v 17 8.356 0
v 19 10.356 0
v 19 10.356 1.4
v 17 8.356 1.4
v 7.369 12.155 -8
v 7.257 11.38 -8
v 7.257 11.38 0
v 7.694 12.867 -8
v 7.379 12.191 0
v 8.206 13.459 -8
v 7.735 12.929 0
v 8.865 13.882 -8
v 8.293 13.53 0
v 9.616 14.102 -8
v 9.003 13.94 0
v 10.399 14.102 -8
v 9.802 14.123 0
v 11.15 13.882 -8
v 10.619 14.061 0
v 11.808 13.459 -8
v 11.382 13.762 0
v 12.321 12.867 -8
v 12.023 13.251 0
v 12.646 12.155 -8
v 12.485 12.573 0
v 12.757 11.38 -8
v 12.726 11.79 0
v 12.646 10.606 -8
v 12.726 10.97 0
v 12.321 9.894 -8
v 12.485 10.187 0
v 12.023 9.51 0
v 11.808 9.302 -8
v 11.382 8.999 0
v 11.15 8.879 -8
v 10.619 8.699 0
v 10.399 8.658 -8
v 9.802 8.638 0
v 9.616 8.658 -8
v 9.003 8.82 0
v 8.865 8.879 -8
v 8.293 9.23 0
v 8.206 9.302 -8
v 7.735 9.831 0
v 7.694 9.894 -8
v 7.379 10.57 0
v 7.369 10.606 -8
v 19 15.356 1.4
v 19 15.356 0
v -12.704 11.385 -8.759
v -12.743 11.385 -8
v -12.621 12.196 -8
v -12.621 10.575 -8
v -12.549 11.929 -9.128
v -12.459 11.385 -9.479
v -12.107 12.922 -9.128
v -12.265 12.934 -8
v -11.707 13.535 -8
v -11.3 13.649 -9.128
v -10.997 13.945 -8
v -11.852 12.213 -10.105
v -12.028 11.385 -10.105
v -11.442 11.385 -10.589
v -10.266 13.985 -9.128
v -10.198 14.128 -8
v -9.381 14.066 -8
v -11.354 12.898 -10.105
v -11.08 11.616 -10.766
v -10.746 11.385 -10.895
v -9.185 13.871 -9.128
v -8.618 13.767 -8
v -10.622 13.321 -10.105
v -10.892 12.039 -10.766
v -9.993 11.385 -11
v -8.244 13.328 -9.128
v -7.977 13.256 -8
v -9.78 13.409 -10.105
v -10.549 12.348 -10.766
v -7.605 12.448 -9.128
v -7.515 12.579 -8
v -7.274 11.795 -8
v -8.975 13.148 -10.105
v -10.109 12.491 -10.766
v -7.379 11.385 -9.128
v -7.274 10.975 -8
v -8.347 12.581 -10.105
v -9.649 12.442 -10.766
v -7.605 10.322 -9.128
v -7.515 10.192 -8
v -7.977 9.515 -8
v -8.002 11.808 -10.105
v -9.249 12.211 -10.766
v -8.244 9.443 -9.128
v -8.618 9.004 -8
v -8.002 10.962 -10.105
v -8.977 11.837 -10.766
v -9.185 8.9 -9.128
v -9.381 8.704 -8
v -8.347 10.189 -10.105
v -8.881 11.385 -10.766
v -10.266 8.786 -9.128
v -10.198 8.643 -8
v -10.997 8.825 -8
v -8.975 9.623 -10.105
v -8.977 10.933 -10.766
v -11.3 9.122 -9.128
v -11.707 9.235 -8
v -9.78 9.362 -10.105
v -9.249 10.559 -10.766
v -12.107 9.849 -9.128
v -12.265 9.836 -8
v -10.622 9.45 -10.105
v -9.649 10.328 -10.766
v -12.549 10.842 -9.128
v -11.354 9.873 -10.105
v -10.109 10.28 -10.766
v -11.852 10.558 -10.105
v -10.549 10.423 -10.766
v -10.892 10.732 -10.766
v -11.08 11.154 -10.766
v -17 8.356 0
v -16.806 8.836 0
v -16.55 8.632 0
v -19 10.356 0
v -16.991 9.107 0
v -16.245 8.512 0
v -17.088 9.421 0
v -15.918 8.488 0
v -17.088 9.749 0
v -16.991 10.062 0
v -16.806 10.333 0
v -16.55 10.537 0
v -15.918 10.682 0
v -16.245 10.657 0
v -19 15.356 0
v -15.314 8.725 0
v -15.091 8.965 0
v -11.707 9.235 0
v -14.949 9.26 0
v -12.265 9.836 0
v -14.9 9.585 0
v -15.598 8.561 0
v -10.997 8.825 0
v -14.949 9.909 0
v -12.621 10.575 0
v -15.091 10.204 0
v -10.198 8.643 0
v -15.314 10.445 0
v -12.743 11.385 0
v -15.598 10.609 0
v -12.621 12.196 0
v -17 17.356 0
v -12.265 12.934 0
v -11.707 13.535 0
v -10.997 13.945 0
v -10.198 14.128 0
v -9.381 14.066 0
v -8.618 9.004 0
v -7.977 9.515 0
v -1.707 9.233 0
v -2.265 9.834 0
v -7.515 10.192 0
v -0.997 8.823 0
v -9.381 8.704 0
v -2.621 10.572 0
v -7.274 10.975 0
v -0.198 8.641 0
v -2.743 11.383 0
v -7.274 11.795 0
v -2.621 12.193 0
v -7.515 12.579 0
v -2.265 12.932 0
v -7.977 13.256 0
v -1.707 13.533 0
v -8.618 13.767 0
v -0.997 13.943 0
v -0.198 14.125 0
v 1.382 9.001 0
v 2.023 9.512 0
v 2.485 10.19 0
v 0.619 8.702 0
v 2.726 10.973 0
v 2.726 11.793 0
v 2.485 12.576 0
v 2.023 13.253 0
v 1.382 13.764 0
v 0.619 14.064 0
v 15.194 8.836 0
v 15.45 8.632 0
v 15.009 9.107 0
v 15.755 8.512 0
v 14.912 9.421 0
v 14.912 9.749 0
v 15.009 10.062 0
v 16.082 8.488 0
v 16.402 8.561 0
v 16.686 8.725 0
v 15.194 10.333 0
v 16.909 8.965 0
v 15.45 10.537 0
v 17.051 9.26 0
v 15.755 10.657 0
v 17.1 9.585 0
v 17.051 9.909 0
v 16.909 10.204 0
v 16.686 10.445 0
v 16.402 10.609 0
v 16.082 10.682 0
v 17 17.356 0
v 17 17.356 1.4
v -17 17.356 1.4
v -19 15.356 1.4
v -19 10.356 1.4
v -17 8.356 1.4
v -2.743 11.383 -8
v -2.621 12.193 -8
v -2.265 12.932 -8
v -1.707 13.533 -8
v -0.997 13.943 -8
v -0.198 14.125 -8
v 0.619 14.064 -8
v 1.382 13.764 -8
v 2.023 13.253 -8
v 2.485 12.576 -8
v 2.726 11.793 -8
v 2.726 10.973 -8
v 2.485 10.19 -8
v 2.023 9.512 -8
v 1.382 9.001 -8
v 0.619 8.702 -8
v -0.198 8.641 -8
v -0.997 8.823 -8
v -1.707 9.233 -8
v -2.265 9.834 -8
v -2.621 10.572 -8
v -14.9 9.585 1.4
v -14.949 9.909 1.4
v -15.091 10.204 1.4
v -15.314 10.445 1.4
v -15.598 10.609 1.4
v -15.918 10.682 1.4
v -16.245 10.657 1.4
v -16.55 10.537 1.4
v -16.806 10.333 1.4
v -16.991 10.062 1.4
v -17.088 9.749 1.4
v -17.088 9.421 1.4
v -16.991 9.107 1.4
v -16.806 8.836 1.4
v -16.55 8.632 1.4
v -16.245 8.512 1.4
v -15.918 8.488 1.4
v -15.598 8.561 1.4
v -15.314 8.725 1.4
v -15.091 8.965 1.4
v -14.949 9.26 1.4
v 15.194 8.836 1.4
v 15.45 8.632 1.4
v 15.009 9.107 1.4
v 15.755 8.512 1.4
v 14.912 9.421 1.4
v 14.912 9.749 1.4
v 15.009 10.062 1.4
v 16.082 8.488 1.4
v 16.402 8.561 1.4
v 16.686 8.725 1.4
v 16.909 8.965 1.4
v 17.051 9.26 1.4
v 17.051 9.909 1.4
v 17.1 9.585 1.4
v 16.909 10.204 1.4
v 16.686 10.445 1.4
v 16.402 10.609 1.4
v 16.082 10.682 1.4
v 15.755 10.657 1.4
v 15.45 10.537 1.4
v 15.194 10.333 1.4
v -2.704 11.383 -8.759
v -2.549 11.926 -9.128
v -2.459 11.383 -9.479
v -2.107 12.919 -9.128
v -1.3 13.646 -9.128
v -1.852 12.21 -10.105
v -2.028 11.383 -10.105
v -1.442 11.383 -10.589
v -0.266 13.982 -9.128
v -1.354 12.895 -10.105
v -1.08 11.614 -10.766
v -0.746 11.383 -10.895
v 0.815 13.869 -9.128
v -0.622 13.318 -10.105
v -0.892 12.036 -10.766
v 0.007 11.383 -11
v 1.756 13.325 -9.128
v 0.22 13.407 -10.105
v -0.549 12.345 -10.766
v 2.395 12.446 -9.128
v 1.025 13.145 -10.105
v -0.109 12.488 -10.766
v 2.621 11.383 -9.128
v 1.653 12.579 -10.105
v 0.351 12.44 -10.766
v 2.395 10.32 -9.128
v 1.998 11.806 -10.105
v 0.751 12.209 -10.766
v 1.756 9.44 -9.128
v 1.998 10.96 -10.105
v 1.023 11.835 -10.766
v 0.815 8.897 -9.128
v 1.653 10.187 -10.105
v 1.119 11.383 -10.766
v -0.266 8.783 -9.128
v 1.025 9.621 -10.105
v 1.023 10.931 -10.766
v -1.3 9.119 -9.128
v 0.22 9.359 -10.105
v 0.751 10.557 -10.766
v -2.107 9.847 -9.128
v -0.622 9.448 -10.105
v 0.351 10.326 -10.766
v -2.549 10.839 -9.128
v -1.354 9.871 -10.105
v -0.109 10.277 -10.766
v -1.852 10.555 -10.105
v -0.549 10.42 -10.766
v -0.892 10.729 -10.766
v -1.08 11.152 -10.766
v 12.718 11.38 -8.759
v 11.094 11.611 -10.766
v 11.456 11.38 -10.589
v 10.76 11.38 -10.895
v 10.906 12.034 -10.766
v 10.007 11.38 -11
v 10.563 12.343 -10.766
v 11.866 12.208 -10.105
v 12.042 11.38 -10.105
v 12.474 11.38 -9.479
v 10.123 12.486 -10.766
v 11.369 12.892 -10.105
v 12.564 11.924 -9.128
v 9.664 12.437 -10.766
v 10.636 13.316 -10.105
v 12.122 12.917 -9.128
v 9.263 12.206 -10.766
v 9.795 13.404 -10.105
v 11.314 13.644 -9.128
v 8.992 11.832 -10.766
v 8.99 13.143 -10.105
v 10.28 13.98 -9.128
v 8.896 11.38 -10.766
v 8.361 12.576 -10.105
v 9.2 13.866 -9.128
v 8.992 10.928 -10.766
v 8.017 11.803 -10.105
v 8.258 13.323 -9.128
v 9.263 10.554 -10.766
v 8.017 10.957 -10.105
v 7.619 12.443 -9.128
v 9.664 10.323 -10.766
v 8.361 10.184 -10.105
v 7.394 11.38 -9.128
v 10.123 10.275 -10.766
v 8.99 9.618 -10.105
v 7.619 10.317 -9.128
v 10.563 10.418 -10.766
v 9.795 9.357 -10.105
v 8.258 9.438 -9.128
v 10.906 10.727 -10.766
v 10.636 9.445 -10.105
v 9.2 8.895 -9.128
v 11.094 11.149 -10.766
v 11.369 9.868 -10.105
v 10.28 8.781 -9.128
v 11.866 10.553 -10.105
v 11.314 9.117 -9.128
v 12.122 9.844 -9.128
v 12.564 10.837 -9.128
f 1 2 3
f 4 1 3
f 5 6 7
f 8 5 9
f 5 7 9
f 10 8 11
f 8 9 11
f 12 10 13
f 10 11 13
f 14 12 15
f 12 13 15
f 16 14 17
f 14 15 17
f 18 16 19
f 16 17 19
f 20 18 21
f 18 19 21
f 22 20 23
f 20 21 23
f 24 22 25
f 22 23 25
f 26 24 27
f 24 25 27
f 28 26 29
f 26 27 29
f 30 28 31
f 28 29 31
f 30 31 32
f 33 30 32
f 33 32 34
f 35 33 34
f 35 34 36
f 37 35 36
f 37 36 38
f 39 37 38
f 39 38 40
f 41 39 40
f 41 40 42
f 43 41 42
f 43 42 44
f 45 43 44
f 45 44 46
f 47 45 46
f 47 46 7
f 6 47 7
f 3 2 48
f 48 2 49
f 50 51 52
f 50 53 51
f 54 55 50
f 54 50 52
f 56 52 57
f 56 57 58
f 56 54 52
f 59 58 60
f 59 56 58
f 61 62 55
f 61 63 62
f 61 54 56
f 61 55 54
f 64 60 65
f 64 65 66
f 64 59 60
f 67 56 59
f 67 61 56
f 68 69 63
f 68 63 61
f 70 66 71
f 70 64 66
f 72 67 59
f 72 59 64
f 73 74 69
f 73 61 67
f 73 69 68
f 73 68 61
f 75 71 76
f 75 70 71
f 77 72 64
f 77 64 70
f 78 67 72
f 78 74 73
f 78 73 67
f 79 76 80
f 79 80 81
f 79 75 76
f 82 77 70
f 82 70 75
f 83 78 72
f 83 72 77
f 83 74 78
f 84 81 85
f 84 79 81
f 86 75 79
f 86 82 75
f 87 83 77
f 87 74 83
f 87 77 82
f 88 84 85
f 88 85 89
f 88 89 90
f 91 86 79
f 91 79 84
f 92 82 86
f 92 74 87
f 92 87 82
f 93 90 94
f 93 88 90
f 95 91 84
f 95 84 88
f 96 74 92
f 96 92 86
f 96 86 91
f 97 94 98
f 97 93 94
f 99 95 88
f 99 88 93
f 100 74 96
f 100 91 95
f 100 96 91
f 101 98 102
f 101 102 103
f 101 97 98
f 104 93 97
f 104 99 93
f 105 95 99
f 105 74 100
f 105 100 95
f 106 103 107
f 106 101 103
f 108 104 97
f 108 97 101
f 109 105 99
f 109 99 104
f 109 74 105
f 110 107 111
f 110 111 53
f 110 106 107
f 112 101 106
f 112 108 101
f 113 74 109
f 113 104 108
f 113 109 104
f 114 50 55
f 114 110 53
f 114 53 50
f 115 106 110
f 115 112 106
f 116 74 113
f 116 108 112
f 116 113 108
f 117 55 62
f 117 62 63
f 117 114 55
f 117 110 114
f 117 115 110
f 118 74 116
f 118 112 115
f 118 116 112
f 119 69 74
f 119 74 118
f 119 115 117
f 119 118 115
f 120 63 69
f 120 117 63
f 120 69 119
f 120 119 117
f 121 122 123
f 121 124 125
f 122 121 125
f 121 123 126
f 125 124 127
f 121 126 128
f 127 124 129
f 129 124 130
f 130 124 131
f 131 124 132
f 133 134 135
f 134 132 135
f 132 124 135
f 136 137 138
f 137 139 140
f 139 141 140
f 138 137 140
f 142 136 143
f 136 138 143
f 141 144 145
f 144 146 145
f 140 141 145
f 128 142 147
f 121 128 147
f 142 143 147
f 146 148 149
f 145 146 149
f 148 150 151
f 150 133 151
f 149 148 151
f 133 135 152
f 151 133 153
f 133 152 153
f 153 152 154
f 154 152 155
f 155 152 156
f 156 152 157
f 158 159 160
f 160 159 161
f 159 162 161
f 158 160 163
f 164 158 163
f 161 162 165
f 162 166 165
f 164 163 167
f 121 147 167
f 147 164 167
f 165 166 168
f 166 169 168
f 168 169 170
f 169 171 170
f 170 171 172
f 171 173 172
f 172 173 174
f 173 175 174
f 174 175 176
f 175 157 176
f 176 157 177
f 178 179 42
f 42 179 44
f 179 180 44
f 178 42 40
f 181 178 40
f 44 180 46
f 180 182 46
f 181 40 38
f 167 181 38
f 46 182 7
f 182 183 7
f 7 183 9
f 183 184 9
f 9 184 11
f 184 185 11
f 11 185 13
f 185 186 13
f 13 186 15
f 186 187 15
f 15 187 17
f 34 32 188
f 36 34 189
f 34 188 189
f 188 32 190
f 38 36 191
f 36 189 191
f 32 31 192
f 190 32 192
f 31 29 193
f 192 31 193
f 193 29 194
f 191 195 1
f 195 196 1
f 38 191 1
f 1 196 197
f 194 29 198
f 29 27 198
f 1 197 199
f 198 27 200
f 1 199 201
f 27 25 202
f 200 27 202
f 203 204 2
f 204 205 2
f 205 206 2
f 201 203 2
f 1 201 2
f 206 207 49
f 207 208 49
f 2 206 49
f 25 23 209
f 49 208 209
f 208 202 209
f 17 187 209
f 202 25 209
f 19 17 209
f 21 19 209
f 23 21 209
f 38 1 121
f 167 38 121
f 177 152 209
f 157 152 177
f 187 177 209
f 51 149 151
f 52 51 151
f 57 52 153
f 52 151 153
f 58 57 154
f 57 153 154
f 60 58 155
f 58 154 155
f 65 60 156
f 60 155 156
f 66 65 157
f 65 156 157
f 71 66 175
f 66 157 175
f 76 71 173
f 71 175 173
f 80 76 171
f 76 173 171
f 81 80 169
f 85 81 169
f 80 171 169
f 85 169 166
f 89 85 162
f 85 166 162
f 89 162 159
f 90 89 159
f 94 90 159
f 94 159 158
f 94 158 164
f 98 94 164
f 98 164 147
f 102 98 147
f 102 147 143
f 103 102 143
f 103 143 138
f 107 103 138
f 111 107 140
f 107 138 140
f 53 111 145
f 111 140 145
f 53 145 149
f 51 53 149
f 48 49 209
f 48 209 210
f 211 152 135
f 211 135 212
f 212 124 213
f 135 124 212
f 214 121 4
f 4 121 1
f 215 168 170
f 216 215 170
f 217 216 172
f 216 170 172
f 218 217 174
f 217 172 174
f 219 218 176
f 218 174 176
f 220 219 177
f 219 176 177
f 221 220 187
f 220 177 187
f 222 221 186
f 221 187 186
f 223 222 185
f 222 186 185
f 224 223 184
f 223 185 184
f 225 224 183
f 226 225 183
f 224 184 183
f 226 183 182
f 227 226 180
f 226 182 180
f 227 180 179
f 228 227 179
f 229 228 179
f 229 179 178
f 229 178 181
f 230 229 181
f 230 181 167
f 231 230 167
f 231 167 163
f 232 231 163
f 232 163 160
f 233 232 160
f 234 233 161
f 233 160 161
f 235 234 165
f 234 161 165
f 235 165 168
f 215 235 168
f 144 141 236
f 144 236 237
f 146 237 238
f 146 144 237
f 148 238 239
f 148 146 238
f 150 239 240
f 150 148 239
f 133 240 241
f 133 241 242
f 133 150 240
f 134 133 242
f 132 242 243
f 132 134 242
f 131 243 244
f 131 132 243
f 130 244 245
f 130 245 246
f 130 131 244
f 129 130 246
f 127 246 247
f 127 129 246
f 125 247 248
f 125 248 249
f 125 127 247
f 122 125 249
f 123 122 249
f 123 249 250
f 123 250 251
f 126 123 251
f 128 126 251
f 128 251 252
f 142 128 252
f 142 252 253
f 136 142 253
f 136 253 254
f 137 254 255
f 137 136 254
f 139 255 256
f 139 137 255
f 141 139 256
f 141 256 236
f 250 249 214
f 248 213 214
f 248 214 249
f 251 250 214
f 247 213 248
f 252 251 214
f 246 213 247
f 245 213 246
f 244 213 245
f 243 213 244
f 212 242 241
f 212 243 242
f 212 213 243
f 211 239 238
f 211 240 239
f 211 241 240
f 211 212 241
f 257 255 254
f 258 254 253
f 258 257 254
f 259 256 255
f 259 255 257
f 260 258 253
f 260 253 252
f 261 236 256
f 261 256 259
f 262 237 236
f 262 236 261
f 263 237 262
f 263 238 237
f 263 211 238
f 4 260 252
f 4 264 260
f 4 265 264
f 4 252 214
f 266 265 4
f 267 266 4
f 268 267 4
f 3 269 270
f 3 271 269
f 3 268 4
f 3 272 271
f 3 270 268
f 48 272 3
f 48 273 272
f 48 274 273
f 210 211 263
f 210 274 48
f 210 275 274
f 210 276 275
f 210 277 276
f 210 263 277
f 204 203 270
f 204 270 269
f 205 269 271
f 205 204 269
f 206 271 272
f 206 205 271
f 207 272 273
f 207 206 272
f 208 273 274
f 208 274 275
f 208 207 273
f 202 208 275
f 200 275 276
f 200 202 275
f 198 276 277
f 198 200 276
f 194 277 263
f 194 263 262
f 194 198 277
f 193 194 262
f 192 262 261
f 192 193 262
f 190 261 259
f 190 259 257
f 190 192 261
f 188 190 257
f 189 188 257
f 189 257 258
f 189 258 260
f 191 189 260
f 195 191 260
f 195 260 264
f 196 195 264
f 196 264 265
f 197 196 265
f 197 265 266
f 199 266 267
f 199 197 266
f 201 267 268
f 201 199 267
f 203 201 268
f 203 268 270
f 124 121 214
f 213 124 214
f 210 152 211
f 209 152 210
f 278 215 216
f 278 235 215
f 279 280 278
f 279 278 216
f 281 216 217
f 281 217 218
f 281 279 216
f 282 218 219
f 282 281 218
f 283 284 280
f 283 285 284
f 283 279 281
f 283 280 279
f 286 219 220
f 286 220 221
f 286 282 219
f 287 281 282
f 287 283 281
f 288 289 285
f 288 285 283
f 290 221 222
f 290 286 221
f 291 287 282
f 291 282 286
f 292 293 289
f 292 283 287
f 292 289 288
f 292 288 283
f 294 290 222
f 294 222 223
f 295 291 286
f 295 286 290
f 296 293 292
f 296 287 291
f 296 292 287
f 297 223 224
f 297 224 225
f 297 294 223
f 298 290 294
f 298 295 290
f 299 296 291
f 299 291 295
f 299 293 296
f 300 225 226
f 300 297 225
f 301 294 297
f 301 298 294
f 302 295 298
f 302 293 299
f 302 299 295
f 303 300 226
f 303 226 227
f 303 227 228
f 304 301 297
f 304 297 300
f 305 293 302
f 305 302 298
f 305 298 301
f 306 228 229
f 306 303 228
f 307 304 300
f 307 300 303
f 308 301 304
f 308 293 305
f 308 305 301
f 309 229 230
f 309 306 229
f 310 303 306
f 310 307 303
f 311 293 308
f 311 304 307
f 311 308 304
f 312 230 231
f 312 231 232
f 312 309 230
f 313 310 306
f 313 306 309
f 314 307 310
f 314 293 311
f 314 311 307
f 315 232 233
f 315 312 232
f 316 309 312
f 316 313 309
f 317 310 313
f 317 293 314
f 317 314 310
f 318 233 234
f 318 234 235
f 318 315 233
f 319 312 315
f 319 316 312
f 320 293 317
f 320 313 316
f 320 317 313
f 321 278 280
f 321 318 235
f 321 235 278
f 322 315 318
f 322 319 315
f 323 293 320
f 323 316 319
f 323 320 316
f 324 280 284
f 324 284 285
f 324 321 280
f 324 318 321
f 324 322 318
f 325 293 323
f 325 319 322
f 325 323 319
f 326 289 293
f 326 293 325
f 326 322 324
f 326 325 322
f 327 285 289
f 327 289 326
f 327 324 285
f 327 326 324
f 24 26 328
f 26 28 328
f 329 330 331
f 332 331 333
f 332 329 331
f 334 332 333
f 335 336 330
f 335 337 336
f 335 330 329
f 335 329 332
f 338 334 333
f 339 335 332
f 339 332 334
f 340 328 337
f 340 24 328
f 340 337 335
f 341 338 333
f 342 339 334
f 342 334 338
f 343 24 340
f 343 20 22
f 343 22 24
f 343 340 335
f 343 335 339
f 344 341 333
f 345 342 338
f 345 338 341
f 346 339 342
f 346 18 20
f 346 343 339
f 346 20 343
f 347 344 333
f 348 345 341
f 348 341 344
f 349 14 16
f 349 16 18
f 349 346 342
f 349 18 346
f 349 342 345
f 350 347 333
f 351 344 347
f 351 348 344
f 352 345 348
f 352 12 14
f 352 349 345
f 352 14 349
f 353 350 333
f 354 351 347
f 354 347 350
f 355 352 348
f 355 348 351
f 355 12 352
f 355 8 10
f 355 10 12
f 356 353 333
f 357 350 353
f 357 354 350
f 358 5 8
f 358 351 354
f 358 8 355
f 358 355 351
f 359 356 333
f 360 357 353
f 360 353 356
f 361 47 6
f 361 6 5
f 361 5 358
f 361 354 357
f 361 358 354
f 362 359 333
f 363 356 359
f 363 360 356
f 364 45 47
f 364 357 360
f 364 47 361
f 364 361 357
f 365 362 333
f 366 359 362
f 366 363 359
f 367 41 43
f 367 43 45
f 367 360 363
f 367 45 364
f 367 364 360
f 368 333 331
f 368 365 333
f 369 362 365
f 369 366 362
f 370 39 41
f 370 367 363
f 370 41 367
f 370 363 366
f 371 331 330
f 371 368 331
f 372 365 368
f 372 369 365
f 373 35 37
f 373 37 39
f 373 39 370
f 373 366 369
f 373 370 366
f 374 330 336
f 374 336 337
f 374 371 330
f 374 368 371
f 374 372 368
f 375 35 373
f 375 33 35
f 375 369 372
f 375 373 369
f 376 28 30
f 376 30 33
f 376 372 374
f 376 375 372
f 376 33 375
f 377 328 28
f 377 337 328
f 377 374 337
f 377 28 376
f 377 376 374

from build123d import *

# Parameters (mm, degrees)
ESQUISSE1_W       = 38
ESQUISSE1_H       = 9
ESQUISSE1_R       = 1.1
EXTRUSION1_DEPTH  = 1.4
CHANFREIN1_SIZE   = 2
ESQUISSE3_R       = 2.75
EXTRUSION2_DEPTH  = 8
D_ME1_FACE_RADIUS = 2.75
D_ME1_HEIGHT      = 3
D_ME2_FACE_RADIUS = 2.75
D_ME2_HEIGHT      = 3


# Read off the part's stored shape, not the designer's step: Dôme3
with BuildPart() as part:
    # Esquisse1 → Extrusion1 (new body)
    with BuildSketch(Plane.XY):
        with Locations((0, 12.855949766)):
            Rectangle(ESQUISSE1_W, ESQUISSE1_H)
        with Locations((16, 9.584679883)):
            Circle(ESQUISSE1_R, mode=Mode.SUBTRACT)
        with Locations((-16, 9.584679883)):
            Circle(ESQUISSE1_R, mode=Mode.SUBTRACT)
    extrude(amount=EXTRUSION1_DEPTH)

    # Chanfrein1
    chanfrein1_edges = [part.edges().sort_by_distance(p)[0] for p in [
        (-19, 17.355949766, 0.7),
        (19, 17.355949766, 0.7),
        (19, 8.355949766, 0.7),
        (-19, 8.355949766, 0.7),
    ]]
    chamfer(chanfrein1_edges, length=CHANFREIN1_SIZE)

    # Esquisse3 → Extrusion2 (add)
    with BuildSketch(Plane(origin=(0, 0, 0), x_dir=(-1, 0, 0), z_dir=(0, 0, -1))):
        with Locations((-10.007204419, 11.380286636)):
            Circle(ESQUISSE3_R)
        with Locations((-0.007204739, 11.382819166)):
            Circle(ESQUISSE3_R)
        with Locations((9.99279494, 11.385351696)):
            Circle(ESQUISSE3_R)
    extrude(amount=EXTRUSION2_DEPTH)

    # Dôme1: a dome of height H over a round flat face of radius A is a cap of a sphere of radius (A * A + H * H) / (2 * H)
    d_me1_r = (D_ME1_FACE_RADIUS * D_ME1_FACE_RADIUS + D_ME1_HEIGHT * D_ME1_HEIGHT) / (2 * D_ME1_HEIGHT)
    d_me1_base = Plane((-9.99279494, 11.385351696, -8), z_dir=(0, 0, -1))
    with Locations(d_me1_base.offset(D_ME1_HEIGHT - d_me1_r)):
        d_me1_ball = Sphere(d_me1_r, mode=Mode.PRIVATE)
    add(split(d_me1_ball, bisect_by=d_me1_base, keep=Keep.TOP, mode=Mode.PRIVATE))

    # Dôme2: a dome of height H over a round flat face of radius A is a cap of a sphere of radius (A * A + H * H) / (2 * H)
    d_me2_r = (D_ME2_FACE_RADIUS * D_ME2_FACE_RADIUS + D_ME2_HEIGHT * D_ME2_HEIGHT) / (2 * D_ME2_HEIGHT)
    d_me2_base = Plane((0.007204739, 11.382819166, -8), z_dir=(0, 0, -1))
    with Locations(d_me2_base.offset(D_ME2_HEIGHT - d_me2_r)):
        d_me2_ball = Sphere(d_me2_r, mode=Mode.PRIVATE)
    add(split(d_me2_ball, bisect_by=d_me2_base, keep=Keep.TOP, mode=Mode.PRIVATE))

    # Dôme3 outline → Dôme3 (revolve)
    with BuildSketch(Plane(origin=(10.007204419, 11.380286636, 0), x_dir=(1, 0, 0), z_dir=(0, -1, 0))):
        with BuildLine():
            Line((0, -7.999999997), (0, -11))
            ThreePointArc((0, -11), (2.034852575, -10.104864859), (2.75, -7.999999998))
            Line((2.75, -7.999999998), (0, -7.999999997))
        make_face()
    revolve(axis=Axis((10.007204419, 11.380286636, 0), (0, 0, 1)))


solid = part.part
